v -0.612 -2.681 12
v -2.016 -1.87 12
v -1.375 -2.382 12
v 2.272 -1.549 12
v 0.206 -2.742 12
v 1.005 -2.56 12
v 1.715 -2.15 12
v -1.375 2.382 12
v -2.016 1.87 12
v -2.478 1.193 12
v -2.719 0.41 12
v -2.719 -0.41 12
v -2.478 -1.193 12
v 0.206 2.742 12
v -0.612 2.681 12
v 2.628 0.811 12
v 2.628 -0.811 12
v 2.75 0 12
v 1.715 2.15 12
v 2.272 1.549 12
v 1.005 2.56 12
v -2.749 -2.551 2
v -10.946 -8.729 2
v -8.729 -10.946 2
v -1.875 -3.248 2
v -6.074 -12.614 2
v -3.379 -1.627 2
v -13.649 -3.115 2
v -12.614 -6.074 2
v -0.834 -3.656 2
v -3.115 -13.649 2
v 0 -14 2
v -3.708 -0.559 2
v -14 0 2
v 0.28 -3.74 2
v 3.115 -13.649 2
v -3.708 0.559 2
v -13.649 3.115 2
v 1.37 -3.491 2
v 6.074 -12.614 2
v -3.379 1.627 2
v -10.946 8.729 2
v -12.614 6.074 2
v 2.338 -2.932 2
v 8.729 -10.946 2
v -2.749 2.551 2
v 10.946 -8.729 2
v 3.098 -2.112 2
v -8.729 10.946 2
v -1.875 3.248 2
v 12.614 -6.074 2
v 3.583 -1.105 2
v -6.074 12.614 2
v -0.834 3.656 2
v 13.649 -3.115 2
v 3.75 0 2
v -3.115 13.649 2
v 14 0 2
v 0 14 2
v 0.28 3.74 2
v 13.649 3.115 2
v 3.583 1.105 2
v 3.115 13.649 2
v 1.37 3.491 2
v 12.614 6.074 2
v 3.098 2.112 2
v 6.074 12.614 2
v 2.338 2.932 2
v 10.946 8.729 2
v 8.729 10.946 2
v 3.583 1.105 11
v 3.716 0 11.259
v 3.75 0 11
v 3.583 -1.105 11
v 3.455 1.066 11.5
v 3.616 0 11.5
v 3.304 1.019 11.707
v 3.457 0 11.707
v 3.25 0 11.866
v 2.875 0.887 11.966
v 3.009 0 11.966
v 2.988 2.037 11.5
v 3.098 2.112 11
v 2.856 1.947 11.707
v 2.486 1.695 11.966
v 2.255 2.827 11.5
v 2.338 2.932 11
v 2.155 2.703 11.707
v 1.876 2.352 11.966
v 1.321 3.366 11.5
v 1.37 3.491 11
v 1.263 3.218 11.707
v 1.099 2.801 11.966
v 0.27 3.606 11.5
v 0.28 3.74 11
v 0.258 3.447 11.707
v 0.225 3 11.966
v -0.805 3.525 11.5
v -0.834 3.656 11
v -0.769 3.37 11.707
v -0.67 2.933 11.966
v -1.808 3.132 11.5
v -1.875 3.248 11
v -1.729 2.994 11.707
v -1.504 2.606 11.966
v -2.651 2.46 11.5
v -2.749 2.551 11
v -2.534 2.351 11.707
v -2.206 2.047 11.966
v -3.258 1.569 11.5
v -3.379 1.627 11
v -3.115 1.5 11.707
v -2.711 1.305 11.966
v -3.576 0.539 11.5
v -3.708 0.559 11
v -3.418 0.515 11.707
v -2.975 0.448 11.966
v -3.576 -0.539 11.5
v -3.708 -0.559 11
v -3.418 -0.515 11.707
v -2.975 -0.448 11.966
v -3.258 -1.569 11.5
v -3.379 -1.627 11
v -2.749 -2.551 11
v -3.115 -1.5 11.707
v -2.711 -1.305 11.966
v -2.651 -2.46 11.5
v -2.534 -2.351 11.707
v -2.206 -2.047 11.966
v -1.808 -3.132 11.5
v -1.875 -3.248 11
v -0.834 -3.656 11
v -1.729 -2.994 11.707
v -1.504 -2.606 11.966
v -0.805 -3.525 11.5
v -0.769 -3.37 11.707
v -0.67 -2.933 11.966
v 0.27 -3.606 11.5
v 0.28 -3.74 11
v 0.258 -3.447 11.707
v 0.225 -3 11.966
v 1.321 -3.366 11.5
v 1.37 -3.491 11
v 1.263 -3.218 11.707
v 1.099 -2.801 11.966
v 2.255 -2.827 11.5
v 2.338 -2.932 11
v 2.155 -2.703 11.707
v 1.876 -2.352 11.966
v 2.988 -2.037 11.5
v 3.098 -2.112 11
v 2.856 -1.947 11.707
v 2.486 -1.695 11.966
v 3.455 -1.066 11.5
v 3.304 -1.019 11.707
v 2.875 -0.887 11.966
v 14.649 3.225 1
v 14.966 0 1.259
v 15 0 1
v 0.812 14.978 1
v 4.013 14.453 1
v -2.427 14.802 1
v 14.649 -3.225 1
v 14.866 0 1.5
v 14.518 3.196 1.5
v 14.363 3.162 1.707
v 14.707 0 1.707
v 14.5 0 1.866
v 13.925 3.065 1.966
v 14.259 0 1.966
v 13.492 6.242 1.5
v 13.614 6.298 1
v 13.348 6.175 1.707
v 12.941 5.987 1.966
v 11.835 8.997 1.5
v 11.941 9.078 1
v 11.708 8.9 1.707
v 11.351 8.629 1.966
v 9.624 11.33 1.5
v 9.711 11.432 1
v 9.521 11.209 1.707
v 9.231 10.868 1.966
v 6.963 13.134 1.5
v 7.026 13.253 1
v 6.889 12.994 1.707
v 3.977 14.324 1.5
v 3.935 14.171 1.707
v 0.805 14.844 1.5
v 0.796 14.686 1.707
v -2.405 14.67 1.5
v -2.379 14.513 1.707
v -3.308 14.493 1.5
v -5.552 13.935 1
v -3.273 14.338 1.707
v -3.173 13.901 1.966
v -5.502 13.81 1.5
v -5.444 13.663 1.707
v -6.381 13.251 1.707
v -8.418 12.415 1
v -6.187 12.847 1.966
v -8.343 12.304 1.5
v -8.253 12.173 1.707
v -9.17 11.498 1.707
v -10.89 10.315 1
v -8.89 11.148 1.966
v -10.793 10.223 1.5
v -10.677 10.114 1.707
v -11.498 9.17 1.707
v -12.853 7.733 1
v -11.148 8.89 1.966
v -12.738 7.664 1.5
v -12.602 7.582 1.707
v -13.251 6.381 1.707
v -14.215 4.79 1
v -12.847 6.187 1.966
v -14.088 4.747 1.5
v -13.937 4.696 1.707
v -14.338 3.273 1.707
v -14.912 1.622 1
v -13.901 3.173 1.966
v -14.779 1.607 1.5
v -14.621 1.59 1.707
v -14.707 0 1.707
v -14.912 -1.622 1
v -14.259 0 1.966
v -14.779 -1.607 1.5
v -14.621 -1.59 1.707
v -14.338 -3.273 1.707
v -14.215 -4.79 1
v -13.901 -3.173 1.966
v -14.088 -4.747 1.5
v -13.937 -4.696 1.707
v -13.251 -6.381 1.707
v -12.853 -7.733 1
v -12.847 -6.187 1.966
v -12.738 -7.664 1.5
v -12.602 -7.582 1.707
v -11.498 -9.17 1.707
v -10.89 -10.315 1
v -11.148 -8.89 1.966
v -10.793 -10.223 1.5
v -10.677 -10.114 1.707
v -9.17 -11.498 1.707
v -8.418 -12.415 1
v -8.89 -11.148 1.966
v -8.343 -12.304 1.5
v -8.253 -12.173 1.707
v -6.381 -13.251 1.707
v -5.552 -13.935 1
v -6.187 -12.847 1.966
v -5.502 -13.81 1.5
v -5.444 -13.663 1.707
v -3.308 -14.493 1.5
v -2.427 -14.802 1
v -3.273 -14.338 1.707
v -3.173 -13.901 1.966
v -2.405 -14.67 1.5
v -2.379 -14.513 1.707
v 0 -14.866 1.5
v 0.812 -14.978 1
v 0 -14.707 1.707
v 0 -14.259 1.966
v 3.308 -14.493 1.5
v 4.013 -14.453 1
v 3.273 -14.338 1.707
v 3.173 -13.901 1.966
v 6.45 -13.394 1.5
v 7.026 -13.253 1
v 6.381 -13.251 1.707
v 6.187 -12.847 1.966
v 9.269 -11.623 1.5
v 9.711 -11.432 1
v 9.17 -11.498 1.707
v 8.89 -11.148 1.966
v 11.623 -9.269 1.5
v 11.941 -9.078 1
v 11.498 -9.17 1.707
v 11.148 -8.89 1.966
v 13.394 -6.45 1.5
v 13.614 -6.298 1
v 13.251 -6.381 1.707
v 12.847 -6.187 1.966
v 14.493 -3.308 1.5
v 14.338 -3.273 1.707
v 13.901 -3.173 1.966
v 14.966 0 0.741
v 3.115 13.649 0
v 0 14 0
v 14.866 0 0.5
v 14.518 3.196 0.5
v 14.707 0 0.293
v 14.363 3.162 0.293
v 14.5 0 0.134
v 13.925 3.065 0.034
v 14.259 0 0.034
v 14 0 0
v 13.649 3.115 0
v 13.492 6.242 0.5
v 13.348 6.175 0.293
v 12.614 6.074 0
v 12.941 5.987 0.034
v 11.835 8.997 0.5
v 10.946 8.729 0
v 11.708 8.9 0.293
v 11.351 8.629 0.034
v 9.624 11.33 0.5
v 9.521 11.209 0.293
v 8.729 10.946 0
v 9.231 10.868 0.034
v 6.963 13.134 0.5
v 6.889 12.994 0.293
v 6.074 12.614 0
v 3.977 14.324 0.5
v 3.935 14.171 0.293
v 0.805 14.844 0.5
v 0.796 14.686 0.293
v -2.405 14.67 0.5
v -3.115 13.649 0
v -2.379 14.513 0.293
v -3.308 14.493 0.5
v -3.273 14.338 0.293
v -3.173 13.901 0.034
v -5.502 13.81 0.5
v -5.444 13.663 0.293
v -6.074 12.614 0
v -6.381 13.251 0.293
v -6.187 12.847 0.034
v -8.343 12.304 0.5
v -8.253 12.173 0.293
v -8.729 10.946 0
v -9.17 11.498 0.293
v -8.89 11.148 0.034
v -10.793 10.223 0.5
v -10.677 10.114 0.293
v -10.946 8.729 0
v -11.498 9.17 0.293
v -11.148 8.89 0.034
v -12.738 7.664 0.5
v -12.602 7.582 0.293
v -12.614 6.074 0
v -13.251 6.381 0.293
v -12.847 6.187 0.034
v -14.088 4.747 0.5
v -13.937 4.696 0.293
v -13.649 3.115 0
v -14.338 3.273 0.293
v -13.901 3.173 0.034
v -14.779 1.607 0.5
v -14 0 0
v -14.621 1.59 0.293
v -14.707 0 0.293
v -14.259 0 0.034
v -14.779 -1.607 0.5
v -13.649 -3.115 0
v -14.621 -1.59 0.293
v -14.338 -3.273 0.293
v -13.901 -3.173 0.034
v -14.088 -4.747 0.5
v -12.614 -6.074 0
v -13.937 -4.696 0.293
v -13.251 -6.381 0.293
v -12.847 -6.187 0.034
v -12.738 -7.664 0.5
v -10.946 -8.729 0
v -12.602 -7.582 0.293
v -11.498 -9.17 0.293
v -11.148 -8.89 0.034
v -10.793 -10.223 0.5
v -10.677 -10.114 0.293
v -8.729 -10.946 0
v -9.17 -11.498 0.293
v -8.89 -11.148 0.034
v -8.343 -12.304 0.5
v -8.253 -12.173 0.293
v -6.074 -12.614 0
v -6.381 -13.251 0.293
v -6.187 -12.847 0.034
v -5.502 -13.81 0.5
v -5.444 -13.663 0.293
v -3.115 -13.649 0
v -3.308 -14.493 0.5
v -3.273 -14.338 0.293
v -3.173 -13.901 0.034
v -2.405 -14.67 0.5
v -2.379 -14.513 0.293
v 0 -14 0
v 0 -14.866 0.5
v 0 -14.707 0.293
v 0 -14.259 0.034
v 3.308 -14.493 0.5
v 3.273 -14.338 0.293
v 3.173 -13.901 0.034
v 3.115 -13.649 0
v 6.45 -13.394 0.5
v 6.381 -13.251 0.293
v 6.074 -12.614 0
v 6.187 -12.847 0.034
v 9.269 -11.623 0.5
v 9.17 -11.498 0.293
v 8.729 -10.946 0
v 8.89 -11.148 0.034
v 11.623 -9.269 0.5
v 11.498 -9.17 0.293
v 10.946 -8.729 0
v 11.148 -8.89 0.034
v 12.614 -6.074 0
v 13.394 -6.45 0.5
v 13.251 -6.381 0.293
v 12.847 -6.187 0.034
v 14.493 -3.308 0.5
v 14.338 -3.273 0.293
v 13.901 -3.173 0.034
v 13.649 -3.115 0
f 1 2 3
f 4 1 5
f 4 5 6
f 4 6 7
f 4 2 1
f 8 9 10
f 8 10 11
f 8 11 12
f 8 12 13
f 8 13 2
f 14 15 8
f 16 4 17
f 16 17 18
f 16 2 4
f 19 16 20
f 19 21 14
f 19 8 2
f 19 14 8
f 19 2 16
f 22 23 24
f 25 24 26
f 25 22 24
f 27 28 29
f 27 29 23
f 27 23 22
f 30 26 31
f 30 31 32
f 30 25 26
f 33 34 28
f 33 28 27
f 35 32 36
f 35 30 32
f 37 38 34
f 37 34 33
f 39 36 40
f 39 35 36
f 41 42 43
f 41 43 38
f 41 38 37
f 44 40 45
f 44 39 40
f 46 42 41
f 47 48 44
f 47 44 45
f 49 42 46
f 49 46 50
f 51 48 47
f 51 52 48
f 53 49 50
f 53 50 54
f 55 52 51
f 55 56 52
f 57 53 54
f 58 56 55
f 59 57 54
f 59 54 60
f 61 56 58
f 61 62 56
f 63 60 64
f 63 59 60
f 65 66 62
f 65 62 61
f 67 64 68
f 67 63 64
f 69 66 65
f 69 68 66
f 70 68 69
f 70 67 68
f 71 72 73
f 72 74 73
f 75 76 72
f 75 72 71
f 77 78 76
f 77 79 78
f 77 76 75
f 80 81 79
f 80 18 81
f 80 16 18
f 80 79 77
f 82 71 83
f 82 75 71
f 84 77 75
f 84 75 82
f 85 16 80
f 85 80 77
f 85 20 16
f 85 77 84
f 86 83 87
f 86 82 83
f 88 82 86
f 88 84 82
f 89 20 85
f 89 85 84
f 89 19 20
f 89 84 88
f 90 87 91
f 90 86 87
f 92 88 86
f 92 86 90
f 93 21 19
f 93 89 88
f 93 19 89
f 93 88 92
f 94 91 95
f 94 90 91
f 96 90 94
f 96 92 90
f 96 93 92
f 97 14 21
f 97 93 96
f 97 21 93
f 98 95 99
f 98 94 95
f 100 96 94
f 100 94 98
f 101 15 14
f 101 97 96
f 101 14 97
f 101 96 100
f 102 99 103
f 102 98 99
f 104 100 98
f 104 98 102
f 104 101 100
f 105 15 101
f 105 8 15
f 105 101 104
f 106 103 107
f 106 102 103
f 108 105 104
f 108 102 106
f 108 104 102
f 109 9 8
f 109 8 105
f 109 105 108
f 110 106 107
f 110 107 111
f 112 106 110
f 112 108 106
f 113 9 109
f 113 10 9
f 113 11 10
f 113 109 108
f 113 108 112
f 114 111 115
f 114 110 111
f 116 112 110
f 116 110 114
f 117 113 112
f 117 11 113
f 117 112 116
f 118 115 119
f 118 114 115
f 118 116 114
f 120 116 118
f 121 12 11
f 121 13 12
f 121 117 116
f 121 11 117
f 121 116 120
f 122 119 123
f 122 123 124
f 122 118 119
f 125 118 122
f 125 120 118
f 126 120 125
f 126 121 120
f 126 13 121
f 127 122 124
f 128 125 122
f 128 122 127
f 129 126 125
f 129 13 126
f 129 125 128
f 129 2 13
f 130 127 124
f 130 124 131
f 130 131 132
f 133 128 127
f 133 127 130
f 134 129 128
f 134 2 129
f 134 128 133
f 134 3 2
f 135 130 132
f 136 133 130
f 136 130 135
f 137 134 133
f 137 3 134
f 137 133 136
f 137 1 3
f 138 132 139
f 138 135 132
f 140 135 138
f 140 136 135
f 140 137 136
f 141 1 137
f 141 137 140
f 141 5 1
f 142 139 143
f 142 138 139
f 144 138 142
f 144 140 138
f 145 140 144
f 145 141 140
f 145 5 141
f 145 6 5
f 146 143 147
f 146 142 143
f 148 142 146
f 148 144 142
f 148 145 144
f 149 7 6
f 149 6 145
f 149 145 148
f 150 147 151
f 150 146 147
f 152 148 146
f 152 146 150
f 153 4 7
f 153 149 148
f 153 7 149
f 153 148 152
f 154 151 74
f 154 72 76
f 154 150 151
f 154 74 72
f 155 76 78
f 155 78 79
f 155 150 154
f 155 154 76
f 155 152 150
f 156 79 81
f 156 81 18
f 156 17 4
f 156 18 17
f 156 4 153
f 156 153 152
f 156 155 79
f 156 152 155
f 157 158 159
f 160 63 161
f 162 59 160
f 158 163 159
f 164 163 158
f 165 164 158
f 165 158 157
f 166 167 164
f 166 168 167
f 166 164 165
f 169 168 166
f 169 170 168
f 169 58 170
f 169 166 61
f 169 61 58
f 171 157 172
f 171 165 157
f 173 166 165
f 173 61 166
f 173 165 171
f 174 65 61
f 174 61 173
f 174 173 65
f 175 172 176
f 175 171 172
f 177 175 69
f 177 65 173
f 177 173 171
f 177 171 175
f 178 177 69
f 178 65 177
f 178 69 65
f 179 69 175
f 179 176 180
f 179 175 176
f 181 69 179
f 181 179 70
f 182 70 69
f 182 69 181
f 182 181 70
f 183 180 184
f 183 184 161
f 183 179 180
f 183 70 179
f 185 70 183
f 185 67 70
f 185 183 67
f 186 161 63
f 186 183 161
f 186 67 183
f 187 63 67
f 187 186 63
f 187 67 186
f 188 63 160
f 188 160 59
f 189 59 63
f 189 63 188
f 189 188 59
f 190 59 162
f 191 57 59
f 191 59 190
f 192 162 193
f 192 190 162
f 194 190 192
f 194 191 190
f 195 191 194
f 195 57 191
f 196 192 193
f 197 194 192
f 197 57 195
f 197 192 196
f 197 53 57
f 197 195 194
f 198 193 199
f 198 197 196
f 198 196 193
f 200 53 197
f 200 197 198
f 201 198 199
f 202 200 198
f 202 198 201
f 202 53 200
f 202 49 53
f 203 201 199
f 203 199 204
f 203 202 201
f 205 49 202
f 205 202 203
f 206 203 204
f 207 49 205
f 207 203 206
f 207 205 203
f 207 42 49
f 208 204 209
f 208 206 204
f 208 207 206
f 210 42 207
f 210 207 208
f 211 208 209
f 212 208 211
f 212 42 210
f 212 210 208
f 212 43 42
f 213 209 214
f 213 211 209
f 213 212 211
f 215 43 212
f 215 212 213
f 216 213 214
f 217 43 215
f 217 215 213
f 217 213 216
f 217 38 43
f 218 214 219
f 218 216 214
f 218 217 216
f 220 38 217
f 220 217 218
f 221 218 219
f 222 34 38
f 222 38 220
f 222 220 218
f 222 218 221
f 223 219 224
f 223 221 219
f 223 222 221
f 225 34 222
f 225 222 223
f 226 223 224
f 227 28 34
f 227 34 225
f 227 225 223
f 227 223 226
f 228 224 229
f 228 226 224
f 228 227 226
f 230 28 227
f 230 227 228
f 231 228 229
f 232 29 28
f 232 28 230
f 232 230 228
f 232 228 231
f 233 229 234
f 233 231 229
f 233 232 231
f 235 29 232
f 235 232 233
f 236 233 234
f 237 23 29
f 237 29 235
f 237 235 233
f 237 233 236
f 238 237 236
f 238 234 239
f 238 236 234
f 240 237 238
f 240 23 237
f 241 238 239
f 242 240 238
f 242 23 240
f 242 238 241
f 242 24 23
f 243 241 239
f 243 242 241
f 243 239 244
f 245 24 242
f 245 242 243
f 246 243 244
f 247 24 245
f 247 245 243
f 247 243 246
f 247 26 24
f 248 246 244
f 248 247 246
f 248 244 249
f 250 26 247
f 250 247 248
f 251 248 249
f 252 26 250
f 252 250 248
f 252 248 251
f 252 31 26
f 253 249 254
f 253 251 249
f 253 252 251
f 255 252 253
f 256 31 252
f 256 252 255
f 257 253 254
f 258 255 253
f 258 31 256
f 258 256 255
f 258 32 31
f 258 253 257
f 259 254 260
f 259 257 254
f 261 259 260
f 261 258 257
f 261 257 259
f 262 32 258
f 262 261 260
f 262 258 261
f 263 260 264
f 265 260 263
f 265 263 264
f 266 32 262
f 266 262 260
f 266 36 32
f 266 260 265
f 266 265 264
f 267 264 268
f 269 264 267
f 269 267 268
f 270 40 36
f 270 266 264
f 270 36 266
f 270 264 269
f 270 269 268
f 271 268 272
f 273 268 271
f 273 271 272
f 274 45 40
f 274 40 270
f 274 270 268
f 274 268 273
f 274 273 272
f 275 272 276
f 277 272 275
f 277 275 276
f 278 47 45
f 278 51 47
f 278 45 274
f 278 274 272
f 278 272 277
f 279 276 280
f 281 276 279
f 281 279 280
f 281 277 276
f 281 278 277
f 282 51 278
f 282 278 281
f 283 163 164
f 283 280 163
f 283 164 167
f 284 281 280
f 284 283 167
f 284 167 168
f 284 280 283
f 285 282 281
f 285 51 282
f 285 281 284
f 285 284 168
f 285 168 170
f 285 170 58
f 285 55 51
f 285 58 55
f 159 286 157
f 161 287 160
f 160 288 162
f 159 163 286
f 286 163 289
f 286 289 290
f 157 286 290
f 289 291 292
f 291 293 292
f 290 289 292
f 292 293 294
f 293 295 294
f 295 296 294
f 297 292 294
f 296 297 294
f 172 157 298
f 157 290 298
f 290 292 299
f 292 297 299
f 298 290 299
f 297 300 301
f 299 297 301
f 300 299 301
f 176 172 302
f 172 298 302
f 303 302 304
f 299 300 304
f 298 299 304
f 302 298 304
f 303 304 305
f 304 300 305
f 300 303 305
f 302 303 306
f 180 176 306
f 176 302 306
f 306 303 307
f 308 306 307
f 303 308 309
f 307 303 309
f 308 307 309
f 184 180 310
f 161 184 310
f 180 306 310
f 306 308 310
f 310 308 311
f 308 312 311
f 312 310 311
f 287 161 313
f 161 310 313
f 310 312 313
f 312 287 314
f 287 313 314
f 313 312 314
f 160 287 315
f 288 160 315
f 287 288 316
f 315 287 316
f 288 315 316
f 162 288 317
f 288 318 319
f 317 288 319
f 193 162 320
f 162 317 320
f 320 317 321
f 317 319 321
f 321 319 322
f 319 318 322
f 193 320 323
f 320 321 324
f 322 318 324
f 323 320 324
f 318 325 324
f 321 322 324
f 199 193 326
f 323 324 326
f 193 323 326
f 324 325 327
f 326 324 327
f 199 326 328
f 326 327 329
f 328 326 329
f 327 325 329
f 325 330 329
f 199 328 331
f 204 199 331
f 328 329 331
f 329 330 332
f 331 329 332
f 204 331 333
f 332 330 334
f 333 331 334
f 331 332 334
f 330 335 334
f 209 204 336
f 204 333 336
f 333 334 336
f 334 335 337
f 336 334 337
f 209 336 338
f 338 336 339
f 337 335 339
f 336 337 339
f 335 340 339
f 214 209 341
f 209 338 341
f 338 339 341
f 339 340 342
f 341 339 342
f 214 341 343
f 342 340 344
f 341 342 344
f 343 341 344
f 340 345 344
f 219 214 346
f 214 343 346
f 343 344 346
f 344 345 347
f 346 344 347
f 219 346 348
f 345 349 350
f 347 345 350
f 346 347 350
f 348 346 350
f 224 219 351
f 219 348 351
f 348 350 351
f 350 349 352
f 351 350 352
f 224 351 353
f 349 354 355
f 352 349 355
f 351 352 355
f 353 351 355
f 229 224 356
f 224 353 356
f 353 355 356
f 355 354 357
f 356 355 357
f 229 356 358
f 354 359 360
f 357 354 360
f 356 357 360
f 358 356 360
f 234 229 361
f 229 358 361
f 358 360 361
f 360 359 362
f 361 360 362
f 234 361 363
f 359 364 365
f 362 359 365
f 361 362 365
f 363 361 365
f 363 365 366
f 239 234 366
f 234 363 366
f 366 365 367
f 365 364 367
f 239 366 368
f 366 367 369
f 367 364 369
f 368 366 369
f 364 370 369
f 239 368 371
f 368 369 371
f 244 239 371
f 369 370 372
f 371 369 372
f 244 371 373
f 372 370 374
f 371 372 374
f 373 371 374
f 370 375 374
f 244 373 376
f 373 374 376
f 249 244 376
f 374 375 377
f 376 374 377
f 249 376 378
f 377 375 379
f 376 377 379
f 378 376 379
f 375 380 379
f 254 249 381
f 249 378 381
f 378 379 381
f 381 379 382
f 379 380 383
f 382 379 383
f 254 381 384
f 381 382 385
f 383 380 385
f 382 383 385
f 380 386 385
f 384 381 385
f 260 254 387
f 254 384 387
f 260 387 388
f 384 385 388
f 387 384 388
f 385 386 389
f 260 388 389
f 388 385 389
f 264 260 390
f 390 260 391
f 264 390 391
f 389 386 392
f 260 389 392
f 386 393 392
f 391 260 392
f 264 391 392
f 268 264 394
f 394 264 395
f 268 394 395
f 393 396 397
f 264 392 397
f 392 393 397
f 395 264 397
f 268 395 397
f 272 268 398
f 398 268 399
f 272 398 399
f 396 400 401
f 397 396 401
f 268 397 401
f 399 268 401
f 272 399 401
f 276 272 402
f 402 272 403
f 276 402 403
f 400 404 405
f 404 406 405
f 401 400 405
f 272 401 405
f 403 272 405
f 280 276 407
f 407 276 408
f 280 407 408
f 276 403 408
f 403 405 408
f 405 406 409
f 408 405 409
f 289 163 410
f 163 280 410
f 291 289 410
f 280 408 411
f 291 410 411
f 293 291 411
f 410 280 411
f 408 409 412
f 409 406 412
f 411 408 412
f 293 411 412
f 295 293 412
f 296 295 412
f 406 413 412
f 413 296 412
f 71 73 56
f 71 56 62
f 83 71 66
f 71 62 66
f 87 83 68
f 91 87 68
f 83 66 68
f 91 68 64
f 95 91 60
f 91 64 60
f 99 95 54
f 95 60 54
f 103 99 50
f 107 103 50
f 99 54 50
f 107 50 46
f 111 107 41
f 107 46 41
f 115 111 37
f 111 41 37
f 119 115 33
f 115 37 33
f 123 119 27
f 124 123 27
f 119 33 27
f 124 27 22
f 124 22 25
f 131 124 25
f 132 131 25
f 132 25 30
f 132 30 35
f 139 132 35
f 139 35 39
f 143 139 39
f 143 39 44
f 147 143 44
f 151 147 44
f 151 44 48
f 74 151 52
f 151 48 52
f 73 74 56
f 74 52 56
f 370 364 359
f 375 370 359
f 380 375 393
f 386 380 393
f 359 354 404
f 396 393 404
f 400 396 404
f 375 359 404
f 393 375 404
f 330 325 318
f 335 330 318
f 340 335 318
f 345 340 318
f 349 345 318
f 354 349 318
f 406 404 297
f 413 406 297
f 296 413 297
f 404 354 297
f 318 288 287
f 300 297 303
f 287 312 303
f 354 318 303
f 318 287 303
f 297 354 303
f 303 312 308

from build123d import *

# Parameters (mm, degrees)
F0_R     = 15
F1_DEPTH = 2
F2_R     = 3.75
F3_DEPTH = 10
F4_R     = 0.99999


# Not quite as in the source:
# - a fillet or chamfer is up to 0.001 mm smaller than in the source, because OpenCascade refuses the exact size


with BuildPart() as f1:
    # F0 (on Top) → F1 (new body)
    with BuildSketch(Plane.XY):
        Circle(F0_R)
    extrude(amount=F1_DEPTH)

    # F2 (on face) → F3 (join)
    with BuildSketch(Plane.XY.offset(2)):
        Circle(F2_R)
    extrude(amount=F3_DEPTH)

    # F4 (radius 1 in the source; OpenCascade refuses exactly that, so slightly less here)
    f4_edges = [f1.edges().sort_by_distance(p)[0] for p in [
        (-3.75, 0, 12),
        (15, 0, 1),
        (-15, 0, 0),
        (-15, 0, 2),
    ]]
    fillet(f4_edges, radius=F4_R)


solid = f1.part
